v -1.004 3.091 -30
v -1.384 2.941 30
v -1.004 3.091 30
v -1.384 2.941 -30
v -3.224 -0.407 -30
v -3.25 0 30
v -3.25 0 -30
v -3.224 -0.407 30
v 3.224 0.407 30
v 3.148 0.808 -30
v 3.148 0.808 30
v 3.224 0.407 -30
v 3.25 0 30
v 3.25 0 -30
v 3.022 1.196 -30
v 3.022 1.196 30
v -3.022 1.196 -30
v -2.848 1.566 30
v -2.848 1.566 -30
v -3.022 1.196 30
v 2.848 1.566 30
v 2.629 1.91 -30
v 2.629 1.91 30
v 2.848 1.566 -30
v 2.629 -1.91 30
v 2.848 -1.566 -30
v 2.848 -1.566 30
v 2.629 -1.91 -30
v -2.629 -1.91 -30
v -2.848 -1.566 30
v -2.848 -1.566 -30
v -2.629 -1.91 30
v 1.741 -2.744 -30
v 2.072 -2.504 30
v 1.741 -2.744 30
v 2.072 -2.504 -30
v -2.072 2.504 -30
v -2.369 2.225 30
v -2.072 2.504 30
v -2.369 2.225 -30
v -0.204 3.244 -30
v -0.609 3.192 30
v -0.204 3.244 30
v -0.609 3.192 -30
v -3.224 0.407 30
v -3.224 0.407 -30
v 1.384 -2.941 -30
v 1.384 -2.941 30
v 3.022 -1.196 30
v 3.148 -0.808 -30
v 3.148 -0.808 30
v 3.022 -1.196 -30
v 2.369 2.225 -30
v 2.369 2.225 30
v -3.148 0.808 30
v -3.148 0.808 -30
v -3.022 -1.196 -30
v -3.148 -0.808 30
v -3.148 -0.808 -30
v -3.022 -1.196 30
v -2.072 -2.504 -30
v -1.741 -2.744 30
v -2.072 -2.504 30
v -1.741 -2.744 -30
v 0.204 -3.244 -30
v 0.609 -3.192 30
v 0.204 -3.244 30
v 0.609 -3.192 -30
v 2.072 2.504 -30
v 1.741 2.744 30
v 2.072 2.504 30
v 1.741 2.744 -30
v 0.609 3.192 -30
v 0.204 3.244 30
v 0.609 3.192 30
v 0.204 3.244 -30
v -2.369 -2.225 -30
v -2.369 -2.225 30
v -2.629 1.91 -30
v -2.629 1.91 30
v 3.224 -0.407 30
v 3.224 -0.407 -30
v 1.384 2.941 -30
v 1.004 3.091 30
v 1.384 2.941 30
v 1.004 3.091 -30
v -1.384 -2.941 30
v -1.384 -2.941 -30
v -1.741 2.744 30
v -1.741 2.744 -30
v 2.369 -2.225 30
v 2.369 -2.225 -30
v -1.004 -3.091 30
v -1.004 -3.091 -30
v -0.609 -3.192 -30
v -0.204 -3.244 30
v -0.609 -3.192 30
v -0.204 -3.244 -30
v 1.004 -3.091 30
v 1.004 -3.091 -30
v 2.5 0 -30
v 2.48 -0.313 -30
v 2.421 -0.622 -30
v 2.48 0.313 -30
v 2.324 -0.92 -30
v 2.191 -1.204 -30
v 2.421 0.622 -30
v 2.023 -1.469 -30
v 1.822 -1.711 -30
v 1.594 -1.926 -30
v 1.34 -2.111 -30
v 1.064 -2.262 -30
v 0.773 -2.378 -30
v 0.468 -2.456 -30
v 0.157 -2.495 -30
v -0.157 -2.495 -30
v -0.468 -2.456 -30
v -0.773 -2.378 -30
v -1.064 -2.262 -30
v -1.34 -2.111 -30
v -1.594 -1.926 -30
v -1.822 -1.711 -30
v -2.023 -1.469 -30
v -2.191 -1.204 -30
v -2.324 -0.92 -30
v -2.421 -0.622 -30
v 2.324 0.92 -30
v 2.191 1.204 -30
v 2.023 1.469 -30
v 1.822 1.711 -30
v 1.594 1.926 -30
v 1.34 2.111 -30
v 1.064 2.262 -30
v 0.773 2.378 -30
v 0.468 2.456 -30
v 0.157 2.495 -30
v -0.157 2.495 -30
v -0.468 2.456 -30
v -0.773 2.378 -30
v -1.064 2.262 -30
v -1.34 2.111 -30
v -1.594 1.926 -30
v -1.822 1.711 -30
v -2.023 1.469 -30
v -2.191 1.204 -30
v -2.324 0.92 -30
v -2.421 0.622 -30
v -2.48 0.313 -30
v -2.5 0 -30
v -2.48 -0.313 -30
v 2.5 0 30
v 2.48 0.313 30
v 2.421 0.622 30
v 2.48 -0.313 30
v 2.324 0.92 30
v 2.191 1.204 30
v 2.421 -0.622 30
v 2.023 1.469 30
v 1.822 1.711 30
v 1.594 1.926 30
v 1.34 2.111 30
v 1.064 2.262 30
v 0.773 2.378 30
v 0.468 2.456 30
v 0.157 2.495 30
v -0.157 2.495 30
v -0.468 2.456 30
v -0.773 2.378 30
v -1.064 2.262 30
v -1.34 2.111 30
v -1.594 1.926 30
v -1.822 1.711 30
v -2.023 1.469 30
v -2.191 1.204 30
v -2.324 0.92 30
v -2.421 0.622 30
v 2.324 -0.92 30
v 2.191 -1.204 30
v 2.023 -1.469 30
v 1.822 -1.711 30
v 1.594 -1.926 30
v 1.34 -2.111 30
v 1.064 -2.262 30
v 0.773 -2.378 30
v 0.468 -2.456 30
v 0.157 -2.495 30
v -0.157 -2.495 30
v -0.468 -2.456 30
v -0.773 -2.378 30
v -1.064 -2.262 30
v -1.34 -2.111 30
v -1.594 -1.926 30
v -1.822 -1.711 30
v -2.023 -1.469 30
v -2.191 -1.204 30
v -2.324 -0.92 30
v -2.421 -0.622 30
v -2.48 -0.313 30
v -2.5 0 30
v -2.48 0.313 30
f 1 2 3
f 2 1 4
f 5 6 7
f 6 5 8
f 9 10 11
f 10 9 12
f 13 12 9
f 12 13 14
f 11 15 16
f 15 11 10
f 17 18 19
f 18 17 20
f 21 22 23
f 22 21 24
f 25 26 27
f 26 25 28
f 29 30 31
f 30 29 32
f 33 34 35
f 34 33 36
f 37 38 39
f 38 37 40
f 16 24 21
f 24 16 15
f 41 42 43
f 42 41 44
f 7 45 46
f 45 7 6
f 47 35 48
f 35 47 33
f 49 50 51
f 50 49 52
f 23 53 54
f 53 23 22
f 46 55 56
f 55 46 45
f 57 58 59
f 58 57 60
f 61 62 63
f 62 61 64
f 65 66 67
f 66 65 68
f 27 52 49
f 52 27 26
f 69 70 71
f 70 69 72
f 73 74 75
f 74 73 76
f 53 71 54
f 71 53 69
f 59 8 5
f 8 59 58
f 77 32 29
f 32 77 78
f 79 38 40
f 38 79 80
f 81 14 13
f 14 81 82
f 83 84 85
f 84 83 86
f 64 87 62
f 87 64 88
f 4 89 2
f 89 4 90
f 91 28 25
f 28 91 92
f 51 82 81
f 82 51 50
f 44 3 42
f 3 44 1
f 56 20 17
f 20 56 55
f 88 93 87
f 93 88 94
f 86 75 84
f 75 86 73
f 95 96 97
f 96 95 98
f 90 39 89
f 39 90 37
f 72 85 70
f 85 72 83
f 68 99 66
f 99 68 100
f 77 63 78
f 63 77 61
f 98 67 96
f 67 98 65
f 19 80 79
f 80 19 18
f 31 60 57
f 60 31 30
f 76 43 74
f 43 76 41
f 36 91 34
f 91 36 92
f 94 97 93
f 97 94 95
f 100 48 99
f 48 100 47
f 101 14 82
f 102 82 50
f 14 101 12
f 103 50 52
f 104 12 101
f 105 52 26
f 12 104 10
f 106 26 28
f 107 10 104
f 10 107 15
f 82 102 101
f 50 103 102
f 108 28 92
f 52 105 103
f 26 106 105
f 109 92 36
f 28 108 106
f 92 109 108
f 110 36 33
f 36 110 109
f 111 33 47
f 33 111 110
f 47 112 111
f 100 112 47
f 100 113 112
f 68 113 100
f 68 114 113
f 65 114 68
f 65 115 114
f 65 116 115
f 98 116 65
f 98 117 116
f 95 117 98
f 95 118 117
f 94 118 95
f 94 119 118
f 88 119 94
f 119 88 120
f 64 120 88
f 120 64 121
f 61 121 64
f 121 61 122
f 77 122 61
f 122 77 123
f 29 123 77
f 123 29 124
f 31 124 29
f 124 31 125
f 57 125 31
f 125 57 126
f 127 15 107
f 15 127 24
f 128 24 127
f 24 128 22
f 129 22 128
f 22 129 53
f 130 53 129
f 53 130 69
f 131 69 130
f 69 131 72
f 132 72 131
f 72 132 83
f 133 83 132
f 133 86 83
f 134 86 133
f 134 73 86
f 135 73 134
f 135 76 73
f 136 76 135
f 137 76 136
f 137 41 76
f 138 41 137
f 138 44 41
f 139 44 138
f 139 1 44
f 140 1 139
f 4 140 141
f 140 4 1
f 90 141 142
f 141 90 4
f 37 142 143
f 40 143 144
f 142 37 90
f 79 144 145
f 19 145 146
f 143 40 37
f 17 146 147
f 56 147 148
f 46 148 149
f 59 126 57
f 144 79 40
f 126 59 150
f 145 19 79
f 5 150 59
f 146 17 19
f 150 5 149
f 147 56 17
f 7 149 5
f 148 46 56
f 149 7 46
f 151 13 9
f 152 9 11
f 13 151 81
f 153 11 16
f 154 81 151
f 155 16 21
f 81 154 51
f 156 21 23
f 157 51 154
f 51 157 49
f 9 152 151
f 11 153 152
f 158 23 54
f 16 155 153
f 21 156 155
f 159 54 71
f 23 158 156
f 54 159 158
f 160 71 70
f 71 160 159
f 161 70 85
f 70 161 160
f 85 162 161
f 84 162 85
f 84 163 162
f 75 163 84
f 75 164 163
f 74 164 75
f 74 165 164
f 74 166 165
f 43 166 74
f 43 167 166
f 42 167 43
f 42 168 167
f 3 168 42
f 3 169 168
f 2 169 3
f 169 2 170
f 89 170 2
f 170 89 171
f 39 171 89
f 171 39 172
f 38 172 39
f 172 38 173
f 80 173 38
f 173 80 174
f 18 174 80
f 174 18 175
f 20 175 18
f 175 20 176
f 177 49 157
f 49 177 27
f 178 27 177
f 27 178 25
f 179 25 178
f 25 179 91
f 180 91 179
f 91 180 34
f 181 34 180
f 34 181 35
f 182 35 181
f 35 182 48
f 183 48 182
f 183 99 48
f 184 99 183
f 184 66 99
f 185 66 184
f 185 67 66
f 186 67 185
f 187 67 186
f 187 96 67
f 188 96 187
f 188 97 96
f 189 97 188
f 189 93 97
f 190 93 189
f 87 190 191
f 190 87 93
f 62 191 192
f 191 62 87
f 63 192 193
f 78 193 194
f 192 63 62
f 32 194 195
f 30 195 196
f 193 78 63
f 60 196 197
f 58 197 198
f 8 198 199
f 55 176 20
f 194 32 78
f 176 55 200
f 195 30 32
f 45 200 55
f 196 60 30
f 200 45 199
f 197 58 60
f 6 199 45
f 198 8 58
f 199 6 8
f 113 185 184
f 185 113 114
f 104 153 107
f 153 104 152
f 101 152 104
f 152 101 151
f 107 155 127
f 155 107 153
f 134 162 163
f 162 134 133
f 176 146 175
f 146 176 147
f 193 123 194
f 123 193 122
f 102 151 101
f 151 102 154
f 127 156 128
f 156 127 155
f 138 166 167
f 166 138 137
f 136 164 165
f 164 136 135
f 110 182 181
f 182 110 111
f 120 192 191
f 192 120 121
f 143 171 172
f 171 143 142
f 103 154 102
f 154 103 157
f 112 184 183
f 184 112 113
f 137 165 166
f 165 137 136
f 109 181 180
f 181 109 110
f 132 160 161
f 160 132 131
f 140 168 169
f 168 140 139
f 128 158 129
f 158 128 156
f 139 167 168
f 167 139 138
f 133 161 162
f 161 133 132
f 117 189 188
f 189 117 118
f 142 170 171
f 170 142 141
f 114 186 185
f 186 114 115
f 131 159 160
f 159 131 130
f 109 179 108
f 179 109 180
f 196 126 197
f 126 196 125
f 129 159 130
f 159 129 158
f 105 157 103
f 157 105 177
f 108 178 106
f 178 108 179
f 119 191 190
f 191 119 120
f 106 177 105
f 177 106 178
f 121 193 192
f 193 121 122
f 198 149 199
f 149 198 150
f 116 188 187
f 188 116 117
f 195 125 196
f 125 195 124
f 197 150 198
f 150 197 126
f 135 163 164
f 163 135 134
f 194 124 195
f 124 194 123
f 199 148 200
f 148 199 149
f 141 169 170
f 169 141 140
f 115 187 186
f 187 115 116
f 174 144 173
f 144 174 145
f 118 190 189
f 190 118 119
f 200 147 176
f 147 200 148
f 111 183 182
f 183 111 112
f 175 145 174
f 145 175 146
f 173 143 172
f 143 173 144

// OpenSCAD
$fn = 50;


difference() {
	union() {
		translate(v = [0, 0, -30.0000000000]) {
			cylinder(h = 60, r = 3.2500000000);
		}
	}
	union() {
		translate(v = [0, 0, -100.0000000000]) {
			cylinder(h = 200, r = 2.5000000000);
		}
	}
}
